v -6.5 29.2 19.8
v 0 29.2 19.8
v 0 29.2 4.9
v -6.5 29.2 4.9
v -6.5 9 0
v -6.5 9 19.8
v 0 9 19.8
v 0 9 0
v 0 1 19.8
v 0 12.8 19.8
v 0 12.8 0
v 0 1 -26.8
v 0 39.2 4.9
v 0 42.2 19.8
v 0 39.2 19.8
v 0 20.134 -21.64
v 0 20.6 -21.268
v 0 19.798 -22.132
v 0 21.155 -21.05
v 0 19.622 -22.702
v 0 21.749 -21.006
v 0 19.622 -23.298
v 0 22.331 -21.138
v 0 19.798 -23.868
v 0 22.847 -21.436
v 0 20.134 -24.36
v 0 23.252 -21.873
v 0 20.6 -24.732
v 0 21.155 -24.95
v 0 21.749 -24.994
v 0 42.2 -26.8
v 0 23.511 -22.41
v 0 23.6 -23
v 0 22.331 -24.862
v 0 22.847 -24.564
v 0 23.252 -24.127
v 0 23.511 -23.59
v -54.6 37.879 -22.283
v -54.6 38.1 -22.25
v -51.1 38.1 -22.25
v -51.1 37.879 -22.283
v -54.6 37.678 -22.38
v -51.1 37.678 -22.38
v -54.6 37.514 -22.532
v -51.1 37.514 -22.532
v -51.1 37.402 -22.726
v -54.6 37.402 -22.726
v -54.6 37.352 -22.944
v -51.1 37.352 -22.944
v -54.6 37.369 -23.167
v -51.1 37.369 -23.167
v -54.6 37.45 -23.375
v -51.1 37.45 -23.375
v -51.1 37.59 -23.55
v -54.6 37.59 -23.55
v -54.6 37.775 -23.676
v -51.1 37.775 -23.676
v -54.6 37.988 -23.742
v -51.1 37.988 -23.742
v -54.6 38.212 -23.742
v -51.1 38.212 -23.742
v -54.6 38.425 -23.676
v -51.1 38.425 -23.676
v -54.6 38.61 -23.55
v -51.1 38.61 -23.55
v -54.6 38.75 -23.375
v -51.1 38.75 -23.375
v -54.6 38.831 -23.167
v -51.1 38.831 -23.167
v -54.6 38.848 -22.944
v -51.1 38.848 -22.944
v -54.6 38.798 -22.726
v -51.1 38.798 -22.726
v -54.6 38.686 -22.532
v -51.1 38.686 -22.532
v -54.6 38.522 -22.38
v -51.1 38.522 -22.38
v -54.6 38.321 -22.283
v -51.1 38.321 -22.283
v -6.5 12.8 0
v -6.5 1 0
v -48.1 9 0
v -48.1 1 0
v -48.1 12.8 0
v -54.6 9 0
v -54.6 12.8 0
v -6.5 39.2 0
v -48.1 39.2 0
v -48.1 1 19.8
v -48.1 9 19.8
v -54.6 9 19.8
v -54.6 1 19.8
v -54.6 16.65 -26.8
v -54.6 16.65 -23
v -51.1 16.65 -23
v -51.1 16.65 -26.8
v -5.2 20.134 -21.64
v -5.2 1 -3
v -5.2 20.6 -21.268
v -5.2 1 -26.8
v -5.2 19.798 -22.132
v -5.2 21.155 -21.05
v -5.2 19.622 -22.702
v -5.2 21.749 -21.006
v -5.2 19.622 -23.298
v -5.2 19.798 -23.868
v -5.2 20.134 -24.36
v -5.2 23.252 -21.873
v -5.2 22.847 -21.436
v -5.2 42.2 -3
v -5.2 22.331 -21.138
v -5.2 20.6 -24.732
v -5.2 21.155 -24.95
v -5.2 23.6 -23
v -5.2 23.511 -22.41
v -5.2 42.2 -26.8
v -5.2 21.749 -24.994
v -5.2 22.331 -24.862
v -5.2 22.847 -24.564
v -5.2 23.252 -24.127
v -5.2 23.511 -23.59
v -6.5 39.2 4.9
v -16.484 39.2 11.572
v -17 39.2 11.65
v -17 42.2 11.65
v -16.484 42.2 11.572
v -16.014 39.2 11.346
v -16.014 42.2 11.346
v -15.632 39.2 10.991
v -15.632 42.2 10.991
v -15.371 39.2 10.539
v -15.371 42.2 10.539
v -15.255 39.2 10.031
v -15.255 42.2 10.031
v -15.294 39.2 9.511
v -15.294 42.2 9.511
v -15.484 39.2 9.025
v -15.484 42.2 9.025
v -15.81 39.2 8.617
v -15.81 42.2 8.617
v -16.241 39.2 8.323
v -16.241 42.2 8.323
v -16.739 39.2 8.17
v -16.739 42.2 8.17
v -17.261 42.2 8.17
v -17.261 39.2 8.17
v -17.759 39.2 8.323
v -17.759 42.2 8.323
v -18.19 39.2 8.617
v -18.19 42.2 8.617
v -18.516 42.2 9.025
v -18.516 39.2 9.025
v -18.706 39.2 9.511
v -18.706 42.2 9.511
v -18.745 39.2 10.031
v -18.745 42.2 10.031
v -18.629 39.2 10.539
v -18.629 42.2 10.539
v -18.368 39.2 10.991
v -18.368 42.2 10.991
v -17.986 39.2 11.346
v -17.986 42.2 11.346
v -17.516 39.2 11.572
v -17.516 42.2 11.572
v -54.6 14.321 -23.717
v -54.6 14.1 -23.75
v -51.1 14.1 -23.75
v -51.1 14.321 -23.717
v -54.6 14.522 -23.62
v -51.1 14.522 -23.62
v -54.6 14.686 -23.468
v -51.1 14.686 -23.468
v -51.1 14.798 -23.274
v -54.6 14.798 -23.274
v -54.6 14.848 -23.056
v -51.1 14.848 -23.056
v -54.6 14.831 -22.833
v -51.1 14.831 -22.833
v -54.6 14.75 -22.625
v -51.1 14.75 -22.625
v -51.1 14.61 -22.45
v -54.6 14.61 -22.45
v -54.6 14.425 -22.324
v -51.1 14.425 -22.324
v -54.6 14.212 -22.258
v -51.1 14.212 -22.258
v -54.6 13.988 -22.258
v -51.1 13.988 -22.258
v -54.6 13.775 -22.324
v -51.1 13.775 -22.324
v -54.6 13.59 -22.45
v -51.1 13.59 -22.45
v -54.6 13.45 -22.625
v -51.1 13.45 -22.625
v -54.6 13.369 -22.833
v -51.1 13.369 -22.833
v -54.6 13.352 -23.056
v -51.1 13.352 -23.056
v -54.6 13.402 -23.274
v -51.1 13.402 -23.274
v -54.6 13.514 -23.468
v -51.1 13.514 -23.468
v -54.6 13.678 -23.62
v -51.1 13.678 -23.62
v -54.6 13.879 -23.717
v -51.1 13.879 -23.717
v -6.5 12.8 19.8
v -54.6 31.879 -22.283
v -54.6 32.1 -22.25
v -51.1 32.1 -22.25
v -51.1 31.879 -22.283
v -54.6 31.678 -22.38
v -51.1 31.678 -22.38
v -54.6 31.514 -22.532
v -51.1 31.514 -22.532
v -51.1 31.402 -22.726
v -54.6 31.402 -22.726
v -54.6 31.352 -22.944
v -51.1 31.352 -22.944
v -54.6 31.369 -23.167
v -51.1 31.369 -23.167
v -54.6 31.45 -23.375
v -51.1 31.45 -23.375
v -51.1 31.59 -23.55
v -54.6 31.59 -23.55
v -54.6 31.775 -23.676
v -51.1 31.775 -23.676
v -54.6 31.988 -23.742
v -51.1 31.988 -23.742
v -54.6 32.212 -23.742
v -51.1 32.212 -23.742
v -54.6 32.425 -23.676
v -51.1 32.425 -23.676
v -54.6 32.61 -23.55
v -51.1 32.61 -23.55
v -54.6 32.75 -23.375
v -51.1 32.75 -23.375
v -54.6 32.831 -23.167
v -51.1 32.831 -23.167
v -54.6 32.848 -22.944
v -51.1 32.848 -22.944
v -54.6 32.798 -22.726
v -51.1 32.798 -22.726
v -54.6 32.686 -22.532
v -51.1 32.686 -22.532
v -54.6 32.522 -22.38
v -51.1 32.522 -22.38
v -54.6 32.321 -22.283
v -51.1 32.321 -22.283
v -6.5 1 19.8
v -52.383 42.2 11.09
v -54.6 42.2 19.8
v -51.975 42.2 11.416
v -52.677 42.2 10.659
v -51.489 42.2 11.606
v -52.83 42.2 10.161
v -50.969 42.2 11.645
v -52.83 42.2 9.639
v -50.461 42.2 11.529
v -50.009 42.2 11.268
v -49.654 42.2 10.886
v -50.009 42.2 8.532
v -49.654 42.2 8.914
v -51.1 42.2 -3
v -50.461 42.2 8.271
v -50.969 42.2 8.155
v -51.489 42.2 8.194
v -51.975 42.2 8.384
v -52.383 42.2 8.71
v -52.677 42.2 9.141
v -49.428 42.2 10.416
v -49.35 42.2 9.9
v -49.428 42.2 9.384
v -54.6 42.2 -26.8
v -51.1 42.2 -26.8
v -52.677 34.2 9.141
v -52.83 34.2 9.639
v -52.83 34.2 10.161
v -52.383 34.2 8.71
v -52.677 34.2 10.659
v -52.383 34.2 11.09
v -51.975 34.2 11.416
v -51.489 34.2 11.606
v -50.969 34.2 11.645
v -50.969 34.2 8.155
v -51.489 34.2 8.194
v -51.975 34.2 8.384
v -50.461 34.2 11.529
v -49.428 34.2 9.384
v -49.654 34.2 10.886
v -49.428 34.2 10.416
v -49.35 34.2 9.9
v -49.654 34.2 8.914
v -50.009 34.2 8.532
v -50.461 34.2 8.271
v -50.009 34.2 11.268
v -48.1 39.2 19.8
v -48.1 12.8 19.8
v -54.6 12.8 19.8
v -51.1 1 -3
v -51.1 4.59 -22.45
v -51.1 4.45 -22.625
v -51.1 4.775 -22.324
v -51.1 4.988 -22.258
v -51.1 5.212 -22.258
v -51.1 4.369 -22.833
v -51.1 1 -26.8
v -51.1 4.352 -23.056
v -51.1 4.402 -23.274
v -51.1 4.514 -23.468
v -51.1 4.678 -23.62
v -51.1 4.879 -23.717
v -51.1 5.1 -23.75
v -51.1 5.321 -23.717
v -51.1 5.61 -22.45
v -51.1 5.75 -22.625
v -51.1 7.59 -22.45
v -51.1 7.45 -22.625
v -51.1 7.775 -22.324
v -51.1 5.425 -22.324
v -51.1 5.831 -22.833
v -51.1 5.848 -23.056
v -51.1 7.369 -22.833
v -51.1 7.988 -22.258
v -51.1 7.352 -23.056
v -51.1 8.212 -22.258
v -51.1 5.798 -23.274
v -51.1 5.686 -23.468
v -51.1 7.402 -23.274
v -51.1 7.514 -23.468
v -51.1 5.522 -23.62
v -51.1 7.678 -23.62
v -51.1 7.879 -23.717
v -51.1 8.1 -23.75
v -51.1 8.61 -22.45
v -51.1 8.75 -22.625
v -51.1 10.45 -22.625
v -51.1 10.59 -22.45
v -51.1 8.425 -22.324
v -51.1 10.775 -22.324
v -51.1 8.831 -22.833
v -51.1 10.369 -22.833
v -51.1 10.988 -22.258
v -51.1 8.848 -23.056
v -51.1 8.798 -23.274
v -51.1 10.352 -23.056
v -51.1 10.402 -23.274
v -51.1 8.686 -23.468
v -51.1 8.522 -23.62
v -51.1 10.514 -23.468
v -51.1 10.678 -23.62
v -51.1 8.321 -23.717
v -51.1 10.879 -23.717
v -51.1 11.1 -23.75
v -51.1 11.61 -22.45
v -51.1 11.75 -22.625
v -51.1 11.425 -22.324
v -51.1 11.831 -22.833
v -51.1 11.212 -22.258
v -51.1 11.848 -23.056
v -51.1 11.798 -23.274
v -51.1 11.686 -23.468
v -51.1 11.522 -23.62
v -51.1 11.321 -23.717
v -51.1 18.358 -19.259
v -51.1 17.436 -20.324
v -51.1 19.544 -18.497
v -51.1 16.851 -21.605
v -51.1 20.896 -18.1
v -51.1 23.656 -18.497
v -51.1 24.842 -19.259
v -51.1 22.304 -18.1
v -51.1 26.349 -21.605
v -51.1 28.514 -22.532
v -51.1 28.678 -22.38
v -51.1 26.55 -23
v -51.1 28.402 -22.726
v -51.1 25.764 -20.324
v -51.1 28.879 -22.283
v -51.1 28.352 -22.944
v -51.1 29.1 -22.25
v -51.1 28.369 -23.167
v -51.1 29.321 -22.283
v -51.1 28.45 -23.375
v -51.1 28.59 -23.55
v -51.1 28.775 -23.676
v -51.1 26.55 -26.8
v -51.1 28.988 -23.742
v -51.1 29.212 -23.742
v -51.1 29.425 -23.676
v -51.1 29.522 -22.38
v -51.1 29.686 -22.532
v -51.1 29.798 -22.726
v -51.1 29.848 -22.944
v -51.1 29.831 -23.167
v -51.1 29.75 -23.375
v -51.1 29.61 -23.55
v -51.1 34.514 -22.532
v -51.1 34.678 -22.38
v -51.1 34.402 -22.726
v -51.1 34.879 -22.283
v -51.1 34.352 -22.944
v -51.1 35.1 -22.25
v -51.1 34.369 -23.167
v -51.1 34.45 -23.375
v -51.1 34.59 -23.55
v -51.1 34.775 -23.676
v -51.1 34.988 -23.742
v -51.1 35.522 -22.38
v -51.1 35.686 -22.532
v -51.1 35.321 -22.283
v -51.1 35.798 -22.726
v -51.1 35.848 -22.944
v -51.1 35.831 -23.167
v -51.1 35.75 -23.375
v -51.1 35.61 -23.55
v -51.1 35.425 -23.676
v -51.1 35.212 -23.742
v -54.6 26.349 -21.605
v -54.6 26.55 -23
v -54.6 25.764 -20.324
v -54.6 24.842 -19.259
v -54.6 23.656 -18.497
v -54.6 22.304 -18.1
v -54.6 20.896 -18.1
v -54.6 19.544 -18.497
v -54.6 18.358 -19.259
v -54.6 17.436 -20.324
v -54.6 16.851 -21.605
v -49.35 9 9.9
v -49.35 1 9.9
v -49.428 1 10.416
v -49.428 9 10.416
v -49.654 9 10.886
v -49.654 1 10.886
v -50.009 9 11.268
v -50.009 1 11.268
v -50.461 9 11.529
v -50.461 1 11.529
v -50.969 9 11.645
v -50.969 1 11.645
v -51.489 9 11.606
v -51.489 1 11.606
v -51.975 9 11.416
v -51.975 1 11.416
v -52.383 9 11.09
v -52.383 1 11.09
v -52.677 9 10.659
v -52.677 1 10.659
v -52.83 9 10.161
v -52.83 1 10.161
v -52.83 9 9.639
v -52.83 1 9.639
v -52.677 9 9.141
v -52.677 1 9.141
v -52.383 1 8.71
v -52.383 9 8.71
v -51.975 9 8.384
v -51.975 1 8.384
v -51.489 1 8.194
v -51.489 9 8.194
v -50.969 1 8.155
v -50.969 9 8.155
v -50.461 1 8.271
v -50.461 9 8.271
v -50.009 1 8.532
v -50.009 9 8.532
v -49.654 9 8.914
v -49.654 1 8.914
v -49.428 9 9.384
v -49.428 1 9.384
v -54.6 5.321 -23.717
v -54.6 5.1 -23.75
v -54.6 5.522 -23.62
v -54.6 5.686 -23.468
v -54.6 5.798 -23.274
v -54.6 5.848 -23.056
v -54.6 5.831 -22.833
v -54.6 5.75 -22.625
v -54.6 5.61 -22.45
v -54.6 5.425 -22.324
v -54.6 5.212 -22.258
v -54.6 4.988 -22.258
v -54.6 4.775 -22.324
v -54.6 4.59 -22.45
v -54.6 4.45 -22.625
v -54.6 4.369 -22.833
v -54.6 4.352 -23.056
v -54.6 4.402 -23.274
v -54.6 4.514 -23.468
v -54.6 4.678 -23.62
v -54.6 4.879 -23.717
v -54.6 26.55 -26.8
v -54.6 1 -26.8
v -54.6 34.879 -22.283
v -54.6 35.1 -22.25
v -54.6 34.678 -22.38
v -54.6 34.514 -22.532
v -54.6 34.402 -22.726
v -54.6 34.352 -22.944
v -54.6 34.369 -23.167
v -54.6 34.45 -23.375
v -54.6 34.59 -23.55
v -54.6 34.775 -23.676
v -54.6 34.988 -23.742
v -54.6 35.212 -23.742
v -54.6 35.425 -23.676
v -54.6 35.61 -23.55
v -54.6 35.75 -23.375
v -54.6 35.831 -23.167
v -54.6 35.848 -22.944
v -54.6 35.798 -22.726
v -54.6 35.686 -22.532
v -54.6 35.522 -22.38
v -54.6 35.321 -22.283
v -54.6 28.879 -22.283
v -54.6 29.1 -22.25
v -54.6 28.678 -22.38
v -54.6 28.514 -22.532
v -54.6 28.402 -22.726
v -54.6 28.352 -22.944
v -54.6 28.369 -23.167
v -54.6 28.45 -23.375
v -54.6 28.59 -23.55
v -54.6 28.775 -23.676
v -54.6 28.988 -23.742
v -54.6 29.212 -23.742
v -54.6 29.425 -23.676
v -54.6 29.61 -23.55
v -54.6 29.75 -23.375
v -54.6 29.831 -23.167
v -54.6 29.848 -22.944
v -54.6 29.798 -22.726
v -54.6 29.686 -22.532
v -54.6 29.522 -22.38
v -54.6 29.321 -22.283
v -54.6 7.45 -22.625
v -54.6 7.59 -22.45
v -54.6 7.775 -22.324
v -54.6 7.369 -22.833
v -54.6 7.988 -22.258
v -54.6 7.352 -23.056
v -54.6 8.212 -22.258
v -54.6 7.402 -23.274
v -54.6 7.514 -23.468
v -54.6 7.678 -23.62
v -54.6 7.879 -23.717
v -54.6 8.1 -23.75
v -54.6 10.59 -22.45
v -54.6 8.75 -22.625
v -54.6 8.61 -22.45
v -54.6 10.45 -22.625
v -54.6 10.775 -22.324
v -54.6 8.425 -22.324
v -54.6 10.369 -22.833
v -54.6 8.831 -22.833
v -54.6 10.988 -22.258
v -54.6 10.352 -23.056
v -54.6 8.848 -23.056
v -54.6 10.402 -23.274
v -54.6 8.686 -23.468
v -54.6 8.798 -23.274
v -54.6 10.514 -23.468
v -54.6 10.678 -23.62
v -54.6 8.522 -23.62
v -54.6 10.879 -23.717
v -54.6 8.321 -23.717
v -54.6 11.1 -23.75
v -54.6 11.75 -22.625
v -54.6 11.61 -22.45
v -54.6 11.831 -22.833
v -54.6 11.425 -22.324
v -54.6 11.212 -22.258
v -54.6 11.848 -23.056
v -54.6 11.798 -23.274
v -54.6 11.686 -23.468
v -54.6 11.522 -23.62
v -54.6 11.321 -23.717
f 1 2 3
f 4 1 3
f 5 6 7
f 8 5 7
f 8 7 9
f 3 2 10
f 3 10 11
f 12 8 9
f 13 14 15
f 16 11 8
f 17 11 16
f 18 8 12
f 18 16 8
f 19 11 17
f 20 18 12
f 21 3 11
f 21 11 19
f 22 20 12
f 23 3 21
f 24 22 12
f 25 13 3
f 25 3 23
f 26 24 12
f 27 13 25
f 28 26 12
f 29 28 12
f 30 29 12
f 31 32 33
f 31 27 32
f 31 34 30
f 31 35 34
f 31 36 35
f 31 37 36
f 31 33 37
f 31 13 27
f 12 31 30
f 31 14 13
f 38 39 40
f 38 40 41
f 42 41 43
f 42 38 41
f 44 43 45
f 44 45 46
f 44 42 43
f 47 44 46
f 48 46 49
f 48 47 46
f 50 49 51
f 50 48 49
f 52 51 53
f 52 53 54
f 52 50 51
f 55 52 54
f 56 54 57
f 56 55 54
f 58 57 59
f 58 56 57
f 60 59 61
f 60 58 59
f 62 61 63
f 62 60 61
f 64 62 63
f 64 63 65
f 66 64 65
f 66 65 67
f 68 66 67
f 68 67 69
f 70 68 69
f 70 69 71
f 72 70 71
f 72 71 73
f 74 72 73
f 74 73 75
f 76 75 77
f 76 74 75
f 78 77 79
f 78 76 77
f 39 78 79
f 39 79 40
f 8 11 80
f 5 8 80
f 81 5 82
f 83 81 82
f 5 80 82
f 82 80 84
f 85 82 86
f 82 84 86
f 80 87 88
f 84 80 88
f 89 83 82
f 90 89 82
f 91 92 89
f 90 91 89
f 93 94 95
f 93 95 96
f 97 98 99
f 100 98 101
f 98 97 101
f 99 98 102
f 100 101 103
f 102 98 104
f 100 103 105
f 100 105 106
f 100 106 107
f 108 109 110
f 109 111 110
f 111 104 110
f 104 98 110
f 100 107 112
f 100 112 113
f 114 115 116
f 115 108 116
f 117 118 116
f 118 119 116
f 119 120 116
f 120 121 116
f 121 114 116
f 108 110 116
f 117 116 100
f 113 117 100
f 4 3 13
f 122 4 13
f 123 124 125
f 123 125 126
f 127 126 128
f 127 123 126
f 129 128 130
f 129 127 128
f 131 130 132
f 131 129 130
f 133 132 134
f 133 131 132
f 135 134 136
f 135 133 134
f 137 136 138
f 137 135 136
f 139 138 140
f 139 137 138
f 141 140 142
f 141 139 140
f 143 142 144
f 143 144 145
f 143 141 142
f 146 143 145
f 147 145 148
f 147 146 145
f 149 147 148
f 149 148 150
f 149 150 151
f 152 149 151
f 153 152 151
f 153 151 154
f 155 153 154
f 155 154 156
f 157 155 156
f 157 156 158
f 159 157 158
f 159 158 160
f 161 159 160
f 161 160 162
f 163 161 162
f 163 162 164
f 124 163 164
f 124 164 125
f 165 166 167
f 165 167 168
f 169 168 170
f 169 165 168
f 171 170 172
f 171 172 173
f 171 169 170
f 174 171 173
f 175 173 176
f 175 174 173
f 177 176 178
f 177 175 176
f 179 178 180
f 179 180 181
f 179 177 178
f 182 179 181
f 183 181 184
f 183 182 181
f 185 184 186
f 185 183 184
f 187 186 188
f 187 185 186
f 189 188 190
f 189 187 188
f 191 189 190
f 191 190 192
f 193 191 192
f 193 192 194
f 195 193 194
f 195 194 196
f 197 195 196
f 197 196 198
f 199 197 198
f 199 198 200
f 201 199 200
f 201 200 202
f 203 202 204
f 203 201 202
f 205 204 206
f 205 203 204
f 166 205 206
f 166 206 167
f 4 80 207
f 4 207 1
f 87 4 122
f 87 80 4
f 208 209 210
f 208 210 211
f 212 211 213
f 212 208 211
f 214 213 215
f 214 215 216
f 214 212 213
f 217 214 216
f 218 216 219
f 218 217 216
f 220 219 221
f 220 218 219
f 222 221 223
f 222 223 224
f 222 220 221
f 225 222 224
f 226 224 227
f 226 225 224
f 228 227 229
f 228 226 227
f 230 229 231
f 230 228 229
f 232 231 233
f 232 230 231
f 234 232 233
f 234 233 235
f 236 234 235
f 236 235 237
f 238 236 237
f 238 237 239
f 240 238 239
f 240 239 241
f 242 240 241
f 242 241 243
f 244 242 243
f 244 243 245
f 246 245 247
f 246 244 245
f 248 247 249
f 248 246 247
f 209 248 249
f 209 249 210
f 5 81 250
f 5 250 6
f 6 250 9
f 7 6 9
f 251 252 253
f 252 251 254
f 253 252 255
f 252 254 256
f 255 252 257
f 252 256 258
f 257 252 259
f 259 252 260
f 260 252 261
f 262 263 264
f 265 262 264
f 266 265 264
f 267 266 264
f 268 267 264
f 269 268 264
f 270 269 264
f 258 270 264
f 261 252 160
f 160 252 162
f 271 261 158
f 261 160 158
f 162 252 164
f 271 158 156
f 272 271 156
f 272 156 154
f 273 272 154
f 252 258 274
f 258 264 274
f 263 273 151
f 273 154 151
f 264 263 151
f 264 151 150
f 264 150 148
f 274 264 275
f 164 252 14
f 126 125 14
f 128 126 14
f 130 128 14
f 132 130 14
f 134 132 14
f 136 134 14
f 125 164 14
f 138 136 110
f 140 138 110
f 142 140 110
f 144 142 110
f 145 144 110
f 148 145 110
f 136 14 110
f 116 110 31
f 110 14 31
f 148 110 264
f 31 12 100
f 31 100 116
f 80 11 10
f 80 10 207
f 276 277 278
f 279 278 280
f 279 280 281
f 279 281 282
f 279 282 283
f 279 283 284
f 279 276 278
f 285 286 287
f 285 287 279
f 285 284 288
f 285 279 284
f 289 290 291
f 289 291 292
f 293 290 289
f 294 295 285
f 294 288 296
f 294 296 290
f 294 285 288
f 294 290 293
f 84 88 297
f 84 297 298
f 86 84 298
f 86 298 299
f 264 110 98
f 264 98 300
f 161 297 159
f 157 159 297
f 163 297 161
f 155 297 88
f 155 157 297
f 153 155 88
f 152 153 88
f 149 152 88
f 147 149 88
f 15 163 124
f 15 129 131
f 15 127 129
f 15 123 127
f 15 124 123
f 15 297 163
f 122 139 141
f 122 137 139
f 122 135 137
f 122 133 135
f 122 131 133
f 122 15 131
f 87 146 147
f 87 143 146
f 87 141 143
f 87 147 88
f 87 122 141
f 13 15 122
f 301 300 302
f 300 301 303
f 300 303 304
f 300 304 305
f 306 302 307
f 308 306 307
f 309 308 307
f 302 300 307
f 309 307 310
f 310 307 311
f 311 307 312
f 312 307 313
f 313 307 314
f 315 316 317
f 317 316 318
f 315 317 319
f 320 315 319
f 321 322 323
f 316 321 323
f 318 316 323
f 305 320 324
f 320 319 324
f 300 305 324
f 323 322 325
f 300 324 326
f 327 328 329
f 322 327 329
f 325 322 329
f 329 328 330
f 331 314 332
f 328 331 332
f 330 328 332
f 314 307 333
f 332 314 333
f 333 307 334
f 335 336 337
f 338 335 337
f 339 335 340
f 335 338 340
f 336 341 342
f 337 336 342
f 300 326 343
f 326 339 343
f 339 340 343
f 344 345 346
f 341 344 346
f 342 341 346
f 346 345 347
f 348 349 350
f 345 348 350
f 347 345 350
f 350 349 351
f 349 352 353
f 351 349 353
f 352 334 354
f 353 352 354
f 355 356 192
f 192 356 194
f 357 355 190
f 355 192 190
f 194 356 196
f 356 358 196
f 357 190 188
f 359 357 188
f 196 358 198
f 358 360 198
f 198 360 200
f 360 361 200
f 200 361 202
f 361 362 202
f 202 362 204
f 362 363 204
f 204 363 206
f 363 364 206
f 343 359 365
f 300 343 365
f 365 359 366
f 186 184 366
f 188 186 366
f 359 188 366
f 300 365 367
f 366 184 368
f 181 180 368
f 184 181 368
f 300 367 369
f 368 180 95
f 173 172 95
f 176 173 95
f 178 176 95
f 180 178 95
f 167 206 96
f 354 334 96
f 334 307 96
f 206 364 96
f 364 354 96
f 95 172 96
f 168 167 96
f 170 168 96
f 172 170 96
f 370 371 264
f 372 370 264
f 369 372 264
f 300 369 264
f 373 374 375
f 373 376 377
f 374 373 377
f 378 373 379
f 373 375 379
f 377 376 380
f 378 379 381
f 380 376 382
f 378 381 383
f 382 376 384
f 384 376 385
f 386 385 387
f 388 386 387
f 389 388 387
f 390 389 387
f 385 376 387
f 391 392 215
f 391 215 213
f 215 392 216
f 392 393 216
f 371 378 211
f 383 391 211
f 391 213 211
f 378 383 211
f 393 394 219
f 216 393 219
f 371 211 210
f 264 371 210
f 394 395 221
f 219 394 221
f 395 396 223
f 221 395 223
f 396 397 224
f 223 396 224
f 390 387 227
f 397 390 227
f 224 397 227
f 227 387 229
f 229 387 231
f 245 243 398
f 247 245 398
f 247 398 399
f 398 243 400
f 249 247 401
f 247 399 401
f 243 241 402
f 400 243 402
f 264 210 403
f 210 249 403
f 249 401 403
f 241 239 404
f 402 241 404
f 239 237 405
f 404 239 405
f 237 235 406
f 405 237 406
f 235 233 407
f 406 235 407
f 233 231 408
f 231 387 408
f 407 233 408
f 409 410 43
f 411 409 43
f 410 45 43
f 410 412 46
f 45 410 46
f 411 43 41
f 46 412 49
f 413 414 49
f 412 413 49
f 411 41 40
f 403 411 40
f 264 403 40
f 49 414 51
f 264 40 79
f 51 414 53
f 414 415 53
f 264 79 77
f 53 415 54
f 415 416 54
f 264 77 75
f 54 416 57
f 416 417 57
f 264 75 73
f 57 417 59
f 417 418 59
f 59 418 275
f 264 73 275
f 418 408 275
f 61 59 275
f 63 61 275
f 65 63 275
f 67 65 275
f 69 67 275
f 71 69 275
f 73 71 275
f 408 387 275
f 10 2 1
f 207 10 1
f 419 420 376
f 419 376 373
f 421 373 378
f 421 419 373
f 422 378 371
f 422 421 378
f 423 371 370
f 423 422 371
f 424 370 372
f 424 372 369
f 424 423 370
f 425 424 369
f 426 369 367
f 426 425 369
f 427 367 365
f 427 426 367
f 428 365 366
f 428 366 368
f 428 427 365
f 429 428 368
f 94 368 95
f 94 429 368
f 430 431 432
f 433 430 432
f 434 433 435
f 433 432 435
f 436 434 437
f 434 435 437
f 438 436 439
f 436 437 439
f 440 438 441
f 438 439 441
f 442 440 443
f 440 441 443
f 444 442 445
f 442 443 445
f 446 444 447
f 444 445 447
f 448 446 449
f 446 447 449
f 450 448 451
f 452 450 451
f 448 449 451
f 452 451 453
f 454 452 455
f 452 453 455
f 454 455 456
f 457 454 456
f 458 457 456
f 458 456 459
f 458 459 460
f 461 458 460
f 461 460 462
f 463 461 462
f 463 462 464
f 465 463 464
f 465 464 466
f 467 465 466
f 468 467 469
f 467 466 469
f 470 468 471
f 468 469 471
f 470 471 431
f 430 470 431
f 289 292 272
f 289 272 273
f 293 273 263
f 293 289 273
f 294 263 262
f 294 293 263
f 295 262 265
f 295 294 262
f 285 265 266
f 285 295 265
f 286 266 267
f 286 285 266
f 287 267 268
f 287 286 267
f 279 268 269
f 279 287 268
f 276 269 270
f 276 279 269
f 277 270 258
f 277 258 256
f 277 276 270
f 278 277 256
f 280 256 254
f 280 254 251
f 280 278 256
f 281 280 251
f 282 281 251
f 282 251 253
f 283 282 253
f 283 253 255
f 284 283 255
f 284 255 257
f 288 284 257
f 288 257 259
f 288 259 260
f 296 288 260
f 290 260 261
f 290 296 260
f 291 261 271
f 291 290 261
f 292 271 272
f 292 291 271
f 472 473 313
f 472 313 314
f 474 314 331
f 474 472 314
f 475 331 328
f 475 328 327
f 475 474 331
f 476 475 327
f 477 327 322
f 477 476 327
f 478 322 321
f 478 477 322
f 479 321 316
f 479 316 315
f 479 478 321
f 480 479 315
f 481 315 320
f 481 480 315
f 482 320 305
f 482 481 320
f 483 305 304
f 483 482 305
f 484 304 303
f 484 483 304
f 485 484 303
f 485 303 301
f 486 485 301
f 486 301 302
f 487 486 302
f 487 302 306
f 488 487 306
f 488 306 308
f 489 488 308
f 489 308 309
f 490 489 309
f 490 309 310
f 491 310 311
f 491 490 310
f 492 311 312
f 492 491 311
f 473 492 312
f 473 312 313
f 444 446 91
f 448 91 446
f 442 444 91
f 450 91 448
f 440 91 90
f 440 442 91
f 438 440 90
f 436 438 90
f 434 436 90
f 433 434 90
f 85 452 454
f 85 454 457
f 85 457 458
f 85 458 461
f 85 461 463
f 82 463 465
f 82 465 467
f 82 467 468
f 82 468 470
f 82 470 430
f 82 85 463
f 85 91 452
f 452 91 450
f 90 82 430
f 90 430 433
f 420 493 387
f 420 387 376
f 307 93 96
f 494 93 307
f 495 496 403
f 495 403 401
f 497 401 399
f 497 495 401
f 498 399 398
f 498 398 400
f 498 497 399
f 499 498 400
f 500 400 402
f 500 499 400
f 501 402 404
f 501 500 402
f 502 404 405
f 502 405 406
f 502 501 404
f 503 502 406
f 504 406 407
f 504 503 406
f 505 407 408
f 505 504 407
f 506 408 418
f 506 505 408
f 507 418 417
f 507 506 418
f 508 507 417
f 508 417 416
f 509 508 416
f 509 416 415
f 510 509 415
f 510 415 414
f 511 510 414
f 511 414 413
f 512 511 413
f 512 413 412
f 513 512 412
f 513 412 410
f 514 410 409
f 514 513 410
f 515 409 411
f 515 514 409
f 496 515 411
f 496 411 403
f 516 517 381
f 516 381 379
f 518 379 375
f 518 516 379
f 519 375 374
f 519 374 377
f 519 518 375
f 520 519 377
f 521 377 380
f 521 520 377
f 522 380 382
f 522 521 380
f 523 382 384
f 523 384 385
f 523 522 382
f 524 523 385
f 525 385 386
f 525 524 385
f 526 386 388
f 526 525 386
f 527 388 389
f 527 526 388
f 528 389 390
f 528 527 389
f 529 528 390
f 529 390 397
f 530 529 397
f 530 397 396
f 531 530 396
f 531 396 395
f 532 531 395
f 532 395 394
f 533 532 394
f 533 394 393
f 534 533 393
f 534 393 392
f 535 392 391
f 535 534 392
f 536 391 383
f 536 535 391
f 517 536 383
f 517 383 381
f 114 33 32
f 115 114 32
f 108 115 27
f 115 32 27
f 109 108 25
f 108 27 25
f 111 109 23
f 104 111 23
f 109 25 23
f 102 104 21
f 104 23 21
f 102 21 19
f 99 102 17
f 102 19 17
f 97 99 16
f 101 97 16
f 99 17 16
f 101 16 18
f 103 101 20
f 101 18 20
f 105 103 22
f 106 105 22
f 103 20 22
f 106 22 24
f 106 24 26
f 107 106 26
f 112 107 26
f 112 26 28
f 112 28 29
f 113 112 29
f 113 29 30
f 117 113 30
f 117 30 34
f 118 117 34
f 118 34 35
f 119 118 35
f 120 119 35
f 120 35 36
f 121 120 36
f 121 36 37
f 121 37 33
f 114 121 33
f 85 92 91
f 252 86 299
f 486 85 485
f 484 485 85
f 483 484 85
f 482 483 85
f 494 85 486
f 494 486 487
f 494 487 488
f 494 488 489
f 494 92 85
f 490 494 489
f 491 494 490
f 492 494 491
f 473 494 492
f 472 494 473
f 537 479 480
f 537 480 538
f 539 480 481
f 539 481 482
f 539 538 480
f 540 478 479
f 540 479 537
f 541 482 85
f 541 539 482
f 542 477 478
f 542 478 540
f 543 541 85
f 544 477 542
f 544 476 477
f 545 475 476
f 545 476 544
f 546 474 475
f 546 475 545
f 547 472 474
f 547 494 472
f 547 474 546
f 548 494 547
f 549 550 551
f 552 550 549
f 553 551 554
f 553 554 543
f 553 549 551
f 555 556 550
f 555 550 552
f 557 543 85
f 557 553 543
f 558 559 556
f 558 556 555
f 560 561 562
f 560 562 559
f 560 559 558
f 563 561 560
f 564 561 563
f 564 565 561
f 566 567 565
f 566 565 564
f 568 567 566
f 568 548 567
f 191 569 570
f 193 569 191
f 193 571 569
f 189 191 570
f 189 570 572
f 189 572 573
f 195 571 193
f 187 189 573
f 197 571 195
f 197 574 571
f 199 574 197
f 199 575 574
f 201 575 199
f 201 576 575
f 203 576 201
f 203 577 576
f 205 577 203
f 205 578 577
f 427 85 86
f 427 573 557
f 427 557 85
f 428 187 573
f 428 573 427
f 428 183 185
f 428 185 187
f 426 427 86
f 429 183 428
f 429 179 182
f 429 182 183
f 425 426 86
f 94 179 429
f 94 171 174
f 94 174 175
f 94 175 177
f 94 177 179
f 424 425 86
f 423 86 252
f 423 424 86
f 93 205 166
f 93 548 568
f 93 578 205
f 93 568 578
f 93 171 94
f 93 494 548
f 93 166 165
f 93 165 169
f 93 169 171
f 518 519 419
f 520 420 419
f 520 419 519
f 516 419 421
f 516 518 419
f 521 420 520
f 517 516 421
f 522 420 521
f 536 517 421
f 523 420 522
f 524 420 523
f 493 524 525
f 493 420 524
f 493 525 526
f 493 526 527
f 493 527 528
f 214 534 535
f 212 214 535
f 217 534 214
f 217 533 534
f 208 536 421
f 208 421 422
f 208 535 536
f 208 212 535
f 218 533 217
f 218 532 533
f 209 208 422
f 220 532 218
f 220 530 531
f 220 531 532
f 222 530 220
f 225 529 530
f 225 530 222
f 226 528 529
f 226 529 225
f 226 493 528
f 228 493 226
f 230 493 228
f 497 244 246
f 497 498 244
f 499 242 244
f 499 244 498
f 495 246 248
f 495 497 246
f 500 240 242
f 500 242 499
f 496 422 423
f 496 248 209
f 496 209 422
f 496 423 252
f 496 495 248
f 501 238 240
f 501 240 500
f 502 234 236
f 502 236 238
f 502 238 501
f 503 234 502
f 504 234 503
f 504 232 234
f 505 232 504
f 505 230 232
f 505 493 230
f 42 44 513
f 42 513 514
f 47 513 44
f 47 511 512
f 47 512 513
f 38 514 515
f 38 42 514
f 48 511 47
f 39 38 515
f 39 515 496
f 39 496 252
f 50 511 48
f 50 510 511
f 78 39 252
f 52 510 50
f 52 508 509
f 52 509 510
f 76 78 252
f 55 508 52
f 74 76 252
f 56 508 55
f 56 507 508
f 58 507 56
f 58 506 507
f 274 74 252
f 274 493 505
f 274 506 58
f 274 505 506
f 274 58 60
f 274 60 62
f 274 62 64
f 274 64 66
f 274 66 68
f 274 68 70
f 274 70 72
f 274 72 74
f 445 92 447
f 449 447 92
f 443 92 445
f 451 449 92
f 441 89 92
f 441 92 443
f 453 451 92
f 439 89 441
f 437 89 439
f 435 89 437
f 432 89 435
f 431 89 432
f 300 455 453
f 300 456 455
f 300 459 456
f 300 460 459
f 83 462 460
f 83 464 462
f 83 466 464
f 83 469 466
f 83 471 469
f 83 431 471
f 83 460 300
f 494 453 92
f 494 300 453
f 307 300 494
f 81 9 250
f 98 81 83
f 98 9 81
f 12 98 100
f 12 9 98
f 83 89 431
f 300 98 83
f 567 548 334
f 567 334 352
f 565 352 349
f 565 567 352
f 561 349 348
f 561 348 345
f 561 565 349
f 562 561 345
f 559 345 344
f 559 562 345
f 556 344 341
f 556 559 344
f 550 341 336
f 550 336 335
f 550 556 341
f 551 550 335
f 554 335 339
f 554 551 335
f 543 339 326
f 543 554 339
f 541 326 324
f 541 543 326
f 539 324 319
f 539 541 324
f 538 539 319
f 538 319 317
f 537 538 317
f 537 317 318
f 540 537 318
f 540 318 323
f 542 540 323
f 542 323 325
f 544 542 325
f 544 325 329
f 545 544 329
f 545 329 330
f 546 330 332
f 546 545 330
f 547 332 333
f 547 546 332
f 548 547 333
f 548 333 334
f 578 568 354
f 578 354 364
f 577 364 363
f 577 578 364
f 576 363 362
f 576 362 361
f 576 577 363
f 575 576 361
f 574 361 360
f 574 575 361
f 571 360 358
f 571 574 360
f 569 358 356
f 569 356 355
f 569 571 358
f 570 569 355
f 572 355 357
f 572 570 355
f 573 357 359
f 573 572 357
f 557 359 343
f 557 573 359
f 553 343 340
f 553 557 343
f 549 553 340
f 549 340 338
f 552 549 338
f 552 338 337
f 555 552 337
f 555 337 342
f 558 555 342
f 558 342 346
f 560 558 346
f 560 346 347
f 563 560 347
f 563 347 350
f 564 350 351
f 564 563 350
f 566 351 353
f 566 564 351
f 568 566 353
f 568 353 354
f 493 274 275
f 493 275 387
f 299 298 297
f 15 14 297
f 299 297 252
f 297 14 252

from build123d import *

# Parameters (mm, degrees)
EXTRUDE_1_DEPTH     = 19.8
SKETCH_1_W          = 6.5
SKETCH_1_H          = 8
EXTRUDE_1_2_DEPTH   = 19.8
EXTRUDE_1_3_DEPTH   = 19.8
SKETCH_2_W          = 54.6
SKETCH_2_H          = 41.2
EXTRUDE_2_DEPTH     = 3
SKETCH_4_R          = 0.75
EXTRUDE_3_DEPTH     = 3.5
SKETCH_5_W          = 23.8
SKETCH_5_H          = 41.2
EXTRUDE_4_DEPTH     = 5.2
SKETCH_6_R          = 1.75
CUT_EXTRUDE_2_DEPTH = 8
CUT_EXTRUDE_START   = -8
SKETCH_7_R          = 1.75
CUT_EXTRUDE_3_DEPTH = 8
SKETCH_9_R          = 2
CUT_EXTRUDE_4_DEPTH = 10
SKETCH_10_W         = 14.9
SKETCH_10_H         = 10
CUT_EXTRUDE_5_DEPTH = 7


with BuildPart() as part:
    # 草圖1 → 填料-伸長1 (new body)
    with BuildSketch(Plane.XY):
        Polygon((-48.1, 39.2), (-48.1, 12.8), (-54.6, 12.8), (-54.6, 42.2), (-47.6, 42.2), (-7, 42.2), (0, 42.2), (0, 12.8), (-6.5, 12.8), (-6.5, 39.2), align=None)
    extrude(amount=EXTRUDE_1_DEPTH)



with BuildPart() as body_2:
    # 草圖1 → Extrude 1 2 (new body)
    with BuildSketch(Plane.XY):
        with Locations((-3.25, 5)):
            Rectangle(SKETCH_1_W, SKETCH_1_H)
    extrude(amount=EXTRUDE_1_2_DEPTH)


with BuildPart() as body_3:
    # 草圖1 → Extrude 1 3 (new body)
    with BuildSketch(Plane.XY):
        with Locations((-51.35, 5)):
            Rectangle(SKETCH_1_W, SKETCH_1_H)
    extrude(amount=EXTRUDE_1_3_DEPTH)


with BuildPart() as part_1:
    add(part.part)

    add(body_2.part)  # 填料-伸長2 merges body 2

    add(body_3.part)  # 填料-伸長2 merges body 3
    # 草圖2 → 填料-伸長2 (add)
    with BuildSketch(Plane(origin=(0, 0, 0), x_dir=(-1, 0, 0), z_dir=(0, 0, -1))):
        with Locations((27.3, 21.6)):
            Rectangle(SKETCH_2_W, SKETCH_2_H)
    extrude(amount=EXTRUDE_2_DEPTH)

    # 草圖4 → 填料-伸長3 (add)
    with BuildSketch(Plane(origin=(-54.6, 54.6, 0), x_dir=(0, -1, 0), z_dir=(1, 0, 0))):
        with BuildLine():
            Line((12.4, 26.8), (28.05, 26.8))
            Line((28.05, 26.8), (28.05, 23))
            ThreePointArc((28.05, 23), (33, 18.05), (37.95, 23))
            Line((37.95, 23), (37.95, 26.8))
            Line((37.95, 26.8), (53.6, 26.8))
            Line((53.6, 26.8), (53.6, 23))
            Line((53.6, 23), (53.6, 3))
            Line((53.6, 3), (12.4, 3))
            Line((12.4, 3), (12.4, 23))
            Line((12.4, 23), (12.4, 26.8))
        make_face()
        with Locations(Location((40.5, 23, 0), (0, 0, 90))):
            Circle(SKETCH_4_R, mode=Mode.SUBTRACT)
        with Locations(Location((43.5, 23, 0), (0, 0, 90))):
            Circle(SKETCH_4_R, mode=Mode.SUBTRACT)
        with Locations(Location((46.5, 23, 0), (0, 0, 90))):
            Circle(SKETCH_4_R, mode=Mode.SUBTRACT)
        with Locations(Location((49.5, 23, 0), (0, 0, 90))):
            Circle(SKETCH_4_R, mode=Mode.SUBTRACT)
        with Locations(Location((16.5, 23, 0), (0, 0, 270))):
            Circle(SKETCH_4_R, mode=Mode.SUBTRACT)
        with Locations(Location((19.5, 23, 0), (0, 0, 270))):
            Circle(SKETCH_4_R, mode=Mode.SUBTRACT)
        with Locations(Location((22.5, 23, 0), (0, 0, 270))):
            Circle(SKETCH_4_R, mode=Mode.SUBTRACT)
        with Locations(Location((25.5, 23, 0), (0, 0, 270))):
            Circle(SKETCH_4_R, mode=Mode.SUBTRACT)
    extrude(amount=EXTRUDE_3_DEPTH)

    # 草圖5 → 填料-伸長4 (add)
    with BuildSketch(Plane(origin=(0, 0, 0), x_dir=(0, 0, -1), z_dir=(1, 0, 0))):
        with Locations((14.9, 21.6)):
            Rectangle(SKETCH_5_W, SKETCH_5_H)
    extrude(amount=-EXTRUDE_4_DEPTH)

    # 草圖6 → 除料-伸長2 (cut)
    with BuildSketch(Plane(origin=(0, 1, 0), x_dir=(-1, 0, 0), z_dir=(0, -1, 0))):
        with Locations(Location((51.1, -9.9, 0), (0, 0, 180))):
            Circle(SKETCH_6_R)
    extrude(amount=-CUT_EXTRUDE_2_DEPTH, mode=Mode.SUBTRACT)

    # 草圖7 → 除料-伸長3 (cut)
    with BuildSketch(Plane(origin=(0, 42.2, 0), x_dir=(1, 0, 0), z_dir=(0, 1, 0)).offset(CUT_EXTRUDE_START)):
        with Locations((-51.1, -9.9)):
            Circle(SKETCH_7_R)
        with Locations(Location((-17, -9.9, 0), (0, 0, 270))):
            Circle(SKETCH_7_R)
    extrude(amount=CUT_EXTRUDE_3_DEPTH, mode=Mode.SUBTRACT)

    # 草圖9 → 除料-伸長4 (cut)
    with BuildSketch(Plane(origin=(0, 0, 0), x_dir=(0, 0, -1), z_dir=(1, 0, 0))):
        with Locations(Location((23, 21.6, 0), (0, 0, 90))):
            Circle(SKETCH_9_R)
    extrude(amount=-CUT_EXTRUDE_4_DEPTH, mode=Mode.SUBTRACT)

    # 草圖10 → 除料-伸長5 (cut)
    with BuildSketch(Plane(origin=(0, 0, 0), x_dir=(0, 0, -1), z_dir=(1, 0, 0))):
        with Locations((-12.35, 34.2)):
            Rectangle(SKETCH_10_W, SKETCH_10_H)
    extrude(amount=-CUT_EXTRUDE_5_DEPTH, mode=Mode.SUBTRACT)


solid = part_1.part
